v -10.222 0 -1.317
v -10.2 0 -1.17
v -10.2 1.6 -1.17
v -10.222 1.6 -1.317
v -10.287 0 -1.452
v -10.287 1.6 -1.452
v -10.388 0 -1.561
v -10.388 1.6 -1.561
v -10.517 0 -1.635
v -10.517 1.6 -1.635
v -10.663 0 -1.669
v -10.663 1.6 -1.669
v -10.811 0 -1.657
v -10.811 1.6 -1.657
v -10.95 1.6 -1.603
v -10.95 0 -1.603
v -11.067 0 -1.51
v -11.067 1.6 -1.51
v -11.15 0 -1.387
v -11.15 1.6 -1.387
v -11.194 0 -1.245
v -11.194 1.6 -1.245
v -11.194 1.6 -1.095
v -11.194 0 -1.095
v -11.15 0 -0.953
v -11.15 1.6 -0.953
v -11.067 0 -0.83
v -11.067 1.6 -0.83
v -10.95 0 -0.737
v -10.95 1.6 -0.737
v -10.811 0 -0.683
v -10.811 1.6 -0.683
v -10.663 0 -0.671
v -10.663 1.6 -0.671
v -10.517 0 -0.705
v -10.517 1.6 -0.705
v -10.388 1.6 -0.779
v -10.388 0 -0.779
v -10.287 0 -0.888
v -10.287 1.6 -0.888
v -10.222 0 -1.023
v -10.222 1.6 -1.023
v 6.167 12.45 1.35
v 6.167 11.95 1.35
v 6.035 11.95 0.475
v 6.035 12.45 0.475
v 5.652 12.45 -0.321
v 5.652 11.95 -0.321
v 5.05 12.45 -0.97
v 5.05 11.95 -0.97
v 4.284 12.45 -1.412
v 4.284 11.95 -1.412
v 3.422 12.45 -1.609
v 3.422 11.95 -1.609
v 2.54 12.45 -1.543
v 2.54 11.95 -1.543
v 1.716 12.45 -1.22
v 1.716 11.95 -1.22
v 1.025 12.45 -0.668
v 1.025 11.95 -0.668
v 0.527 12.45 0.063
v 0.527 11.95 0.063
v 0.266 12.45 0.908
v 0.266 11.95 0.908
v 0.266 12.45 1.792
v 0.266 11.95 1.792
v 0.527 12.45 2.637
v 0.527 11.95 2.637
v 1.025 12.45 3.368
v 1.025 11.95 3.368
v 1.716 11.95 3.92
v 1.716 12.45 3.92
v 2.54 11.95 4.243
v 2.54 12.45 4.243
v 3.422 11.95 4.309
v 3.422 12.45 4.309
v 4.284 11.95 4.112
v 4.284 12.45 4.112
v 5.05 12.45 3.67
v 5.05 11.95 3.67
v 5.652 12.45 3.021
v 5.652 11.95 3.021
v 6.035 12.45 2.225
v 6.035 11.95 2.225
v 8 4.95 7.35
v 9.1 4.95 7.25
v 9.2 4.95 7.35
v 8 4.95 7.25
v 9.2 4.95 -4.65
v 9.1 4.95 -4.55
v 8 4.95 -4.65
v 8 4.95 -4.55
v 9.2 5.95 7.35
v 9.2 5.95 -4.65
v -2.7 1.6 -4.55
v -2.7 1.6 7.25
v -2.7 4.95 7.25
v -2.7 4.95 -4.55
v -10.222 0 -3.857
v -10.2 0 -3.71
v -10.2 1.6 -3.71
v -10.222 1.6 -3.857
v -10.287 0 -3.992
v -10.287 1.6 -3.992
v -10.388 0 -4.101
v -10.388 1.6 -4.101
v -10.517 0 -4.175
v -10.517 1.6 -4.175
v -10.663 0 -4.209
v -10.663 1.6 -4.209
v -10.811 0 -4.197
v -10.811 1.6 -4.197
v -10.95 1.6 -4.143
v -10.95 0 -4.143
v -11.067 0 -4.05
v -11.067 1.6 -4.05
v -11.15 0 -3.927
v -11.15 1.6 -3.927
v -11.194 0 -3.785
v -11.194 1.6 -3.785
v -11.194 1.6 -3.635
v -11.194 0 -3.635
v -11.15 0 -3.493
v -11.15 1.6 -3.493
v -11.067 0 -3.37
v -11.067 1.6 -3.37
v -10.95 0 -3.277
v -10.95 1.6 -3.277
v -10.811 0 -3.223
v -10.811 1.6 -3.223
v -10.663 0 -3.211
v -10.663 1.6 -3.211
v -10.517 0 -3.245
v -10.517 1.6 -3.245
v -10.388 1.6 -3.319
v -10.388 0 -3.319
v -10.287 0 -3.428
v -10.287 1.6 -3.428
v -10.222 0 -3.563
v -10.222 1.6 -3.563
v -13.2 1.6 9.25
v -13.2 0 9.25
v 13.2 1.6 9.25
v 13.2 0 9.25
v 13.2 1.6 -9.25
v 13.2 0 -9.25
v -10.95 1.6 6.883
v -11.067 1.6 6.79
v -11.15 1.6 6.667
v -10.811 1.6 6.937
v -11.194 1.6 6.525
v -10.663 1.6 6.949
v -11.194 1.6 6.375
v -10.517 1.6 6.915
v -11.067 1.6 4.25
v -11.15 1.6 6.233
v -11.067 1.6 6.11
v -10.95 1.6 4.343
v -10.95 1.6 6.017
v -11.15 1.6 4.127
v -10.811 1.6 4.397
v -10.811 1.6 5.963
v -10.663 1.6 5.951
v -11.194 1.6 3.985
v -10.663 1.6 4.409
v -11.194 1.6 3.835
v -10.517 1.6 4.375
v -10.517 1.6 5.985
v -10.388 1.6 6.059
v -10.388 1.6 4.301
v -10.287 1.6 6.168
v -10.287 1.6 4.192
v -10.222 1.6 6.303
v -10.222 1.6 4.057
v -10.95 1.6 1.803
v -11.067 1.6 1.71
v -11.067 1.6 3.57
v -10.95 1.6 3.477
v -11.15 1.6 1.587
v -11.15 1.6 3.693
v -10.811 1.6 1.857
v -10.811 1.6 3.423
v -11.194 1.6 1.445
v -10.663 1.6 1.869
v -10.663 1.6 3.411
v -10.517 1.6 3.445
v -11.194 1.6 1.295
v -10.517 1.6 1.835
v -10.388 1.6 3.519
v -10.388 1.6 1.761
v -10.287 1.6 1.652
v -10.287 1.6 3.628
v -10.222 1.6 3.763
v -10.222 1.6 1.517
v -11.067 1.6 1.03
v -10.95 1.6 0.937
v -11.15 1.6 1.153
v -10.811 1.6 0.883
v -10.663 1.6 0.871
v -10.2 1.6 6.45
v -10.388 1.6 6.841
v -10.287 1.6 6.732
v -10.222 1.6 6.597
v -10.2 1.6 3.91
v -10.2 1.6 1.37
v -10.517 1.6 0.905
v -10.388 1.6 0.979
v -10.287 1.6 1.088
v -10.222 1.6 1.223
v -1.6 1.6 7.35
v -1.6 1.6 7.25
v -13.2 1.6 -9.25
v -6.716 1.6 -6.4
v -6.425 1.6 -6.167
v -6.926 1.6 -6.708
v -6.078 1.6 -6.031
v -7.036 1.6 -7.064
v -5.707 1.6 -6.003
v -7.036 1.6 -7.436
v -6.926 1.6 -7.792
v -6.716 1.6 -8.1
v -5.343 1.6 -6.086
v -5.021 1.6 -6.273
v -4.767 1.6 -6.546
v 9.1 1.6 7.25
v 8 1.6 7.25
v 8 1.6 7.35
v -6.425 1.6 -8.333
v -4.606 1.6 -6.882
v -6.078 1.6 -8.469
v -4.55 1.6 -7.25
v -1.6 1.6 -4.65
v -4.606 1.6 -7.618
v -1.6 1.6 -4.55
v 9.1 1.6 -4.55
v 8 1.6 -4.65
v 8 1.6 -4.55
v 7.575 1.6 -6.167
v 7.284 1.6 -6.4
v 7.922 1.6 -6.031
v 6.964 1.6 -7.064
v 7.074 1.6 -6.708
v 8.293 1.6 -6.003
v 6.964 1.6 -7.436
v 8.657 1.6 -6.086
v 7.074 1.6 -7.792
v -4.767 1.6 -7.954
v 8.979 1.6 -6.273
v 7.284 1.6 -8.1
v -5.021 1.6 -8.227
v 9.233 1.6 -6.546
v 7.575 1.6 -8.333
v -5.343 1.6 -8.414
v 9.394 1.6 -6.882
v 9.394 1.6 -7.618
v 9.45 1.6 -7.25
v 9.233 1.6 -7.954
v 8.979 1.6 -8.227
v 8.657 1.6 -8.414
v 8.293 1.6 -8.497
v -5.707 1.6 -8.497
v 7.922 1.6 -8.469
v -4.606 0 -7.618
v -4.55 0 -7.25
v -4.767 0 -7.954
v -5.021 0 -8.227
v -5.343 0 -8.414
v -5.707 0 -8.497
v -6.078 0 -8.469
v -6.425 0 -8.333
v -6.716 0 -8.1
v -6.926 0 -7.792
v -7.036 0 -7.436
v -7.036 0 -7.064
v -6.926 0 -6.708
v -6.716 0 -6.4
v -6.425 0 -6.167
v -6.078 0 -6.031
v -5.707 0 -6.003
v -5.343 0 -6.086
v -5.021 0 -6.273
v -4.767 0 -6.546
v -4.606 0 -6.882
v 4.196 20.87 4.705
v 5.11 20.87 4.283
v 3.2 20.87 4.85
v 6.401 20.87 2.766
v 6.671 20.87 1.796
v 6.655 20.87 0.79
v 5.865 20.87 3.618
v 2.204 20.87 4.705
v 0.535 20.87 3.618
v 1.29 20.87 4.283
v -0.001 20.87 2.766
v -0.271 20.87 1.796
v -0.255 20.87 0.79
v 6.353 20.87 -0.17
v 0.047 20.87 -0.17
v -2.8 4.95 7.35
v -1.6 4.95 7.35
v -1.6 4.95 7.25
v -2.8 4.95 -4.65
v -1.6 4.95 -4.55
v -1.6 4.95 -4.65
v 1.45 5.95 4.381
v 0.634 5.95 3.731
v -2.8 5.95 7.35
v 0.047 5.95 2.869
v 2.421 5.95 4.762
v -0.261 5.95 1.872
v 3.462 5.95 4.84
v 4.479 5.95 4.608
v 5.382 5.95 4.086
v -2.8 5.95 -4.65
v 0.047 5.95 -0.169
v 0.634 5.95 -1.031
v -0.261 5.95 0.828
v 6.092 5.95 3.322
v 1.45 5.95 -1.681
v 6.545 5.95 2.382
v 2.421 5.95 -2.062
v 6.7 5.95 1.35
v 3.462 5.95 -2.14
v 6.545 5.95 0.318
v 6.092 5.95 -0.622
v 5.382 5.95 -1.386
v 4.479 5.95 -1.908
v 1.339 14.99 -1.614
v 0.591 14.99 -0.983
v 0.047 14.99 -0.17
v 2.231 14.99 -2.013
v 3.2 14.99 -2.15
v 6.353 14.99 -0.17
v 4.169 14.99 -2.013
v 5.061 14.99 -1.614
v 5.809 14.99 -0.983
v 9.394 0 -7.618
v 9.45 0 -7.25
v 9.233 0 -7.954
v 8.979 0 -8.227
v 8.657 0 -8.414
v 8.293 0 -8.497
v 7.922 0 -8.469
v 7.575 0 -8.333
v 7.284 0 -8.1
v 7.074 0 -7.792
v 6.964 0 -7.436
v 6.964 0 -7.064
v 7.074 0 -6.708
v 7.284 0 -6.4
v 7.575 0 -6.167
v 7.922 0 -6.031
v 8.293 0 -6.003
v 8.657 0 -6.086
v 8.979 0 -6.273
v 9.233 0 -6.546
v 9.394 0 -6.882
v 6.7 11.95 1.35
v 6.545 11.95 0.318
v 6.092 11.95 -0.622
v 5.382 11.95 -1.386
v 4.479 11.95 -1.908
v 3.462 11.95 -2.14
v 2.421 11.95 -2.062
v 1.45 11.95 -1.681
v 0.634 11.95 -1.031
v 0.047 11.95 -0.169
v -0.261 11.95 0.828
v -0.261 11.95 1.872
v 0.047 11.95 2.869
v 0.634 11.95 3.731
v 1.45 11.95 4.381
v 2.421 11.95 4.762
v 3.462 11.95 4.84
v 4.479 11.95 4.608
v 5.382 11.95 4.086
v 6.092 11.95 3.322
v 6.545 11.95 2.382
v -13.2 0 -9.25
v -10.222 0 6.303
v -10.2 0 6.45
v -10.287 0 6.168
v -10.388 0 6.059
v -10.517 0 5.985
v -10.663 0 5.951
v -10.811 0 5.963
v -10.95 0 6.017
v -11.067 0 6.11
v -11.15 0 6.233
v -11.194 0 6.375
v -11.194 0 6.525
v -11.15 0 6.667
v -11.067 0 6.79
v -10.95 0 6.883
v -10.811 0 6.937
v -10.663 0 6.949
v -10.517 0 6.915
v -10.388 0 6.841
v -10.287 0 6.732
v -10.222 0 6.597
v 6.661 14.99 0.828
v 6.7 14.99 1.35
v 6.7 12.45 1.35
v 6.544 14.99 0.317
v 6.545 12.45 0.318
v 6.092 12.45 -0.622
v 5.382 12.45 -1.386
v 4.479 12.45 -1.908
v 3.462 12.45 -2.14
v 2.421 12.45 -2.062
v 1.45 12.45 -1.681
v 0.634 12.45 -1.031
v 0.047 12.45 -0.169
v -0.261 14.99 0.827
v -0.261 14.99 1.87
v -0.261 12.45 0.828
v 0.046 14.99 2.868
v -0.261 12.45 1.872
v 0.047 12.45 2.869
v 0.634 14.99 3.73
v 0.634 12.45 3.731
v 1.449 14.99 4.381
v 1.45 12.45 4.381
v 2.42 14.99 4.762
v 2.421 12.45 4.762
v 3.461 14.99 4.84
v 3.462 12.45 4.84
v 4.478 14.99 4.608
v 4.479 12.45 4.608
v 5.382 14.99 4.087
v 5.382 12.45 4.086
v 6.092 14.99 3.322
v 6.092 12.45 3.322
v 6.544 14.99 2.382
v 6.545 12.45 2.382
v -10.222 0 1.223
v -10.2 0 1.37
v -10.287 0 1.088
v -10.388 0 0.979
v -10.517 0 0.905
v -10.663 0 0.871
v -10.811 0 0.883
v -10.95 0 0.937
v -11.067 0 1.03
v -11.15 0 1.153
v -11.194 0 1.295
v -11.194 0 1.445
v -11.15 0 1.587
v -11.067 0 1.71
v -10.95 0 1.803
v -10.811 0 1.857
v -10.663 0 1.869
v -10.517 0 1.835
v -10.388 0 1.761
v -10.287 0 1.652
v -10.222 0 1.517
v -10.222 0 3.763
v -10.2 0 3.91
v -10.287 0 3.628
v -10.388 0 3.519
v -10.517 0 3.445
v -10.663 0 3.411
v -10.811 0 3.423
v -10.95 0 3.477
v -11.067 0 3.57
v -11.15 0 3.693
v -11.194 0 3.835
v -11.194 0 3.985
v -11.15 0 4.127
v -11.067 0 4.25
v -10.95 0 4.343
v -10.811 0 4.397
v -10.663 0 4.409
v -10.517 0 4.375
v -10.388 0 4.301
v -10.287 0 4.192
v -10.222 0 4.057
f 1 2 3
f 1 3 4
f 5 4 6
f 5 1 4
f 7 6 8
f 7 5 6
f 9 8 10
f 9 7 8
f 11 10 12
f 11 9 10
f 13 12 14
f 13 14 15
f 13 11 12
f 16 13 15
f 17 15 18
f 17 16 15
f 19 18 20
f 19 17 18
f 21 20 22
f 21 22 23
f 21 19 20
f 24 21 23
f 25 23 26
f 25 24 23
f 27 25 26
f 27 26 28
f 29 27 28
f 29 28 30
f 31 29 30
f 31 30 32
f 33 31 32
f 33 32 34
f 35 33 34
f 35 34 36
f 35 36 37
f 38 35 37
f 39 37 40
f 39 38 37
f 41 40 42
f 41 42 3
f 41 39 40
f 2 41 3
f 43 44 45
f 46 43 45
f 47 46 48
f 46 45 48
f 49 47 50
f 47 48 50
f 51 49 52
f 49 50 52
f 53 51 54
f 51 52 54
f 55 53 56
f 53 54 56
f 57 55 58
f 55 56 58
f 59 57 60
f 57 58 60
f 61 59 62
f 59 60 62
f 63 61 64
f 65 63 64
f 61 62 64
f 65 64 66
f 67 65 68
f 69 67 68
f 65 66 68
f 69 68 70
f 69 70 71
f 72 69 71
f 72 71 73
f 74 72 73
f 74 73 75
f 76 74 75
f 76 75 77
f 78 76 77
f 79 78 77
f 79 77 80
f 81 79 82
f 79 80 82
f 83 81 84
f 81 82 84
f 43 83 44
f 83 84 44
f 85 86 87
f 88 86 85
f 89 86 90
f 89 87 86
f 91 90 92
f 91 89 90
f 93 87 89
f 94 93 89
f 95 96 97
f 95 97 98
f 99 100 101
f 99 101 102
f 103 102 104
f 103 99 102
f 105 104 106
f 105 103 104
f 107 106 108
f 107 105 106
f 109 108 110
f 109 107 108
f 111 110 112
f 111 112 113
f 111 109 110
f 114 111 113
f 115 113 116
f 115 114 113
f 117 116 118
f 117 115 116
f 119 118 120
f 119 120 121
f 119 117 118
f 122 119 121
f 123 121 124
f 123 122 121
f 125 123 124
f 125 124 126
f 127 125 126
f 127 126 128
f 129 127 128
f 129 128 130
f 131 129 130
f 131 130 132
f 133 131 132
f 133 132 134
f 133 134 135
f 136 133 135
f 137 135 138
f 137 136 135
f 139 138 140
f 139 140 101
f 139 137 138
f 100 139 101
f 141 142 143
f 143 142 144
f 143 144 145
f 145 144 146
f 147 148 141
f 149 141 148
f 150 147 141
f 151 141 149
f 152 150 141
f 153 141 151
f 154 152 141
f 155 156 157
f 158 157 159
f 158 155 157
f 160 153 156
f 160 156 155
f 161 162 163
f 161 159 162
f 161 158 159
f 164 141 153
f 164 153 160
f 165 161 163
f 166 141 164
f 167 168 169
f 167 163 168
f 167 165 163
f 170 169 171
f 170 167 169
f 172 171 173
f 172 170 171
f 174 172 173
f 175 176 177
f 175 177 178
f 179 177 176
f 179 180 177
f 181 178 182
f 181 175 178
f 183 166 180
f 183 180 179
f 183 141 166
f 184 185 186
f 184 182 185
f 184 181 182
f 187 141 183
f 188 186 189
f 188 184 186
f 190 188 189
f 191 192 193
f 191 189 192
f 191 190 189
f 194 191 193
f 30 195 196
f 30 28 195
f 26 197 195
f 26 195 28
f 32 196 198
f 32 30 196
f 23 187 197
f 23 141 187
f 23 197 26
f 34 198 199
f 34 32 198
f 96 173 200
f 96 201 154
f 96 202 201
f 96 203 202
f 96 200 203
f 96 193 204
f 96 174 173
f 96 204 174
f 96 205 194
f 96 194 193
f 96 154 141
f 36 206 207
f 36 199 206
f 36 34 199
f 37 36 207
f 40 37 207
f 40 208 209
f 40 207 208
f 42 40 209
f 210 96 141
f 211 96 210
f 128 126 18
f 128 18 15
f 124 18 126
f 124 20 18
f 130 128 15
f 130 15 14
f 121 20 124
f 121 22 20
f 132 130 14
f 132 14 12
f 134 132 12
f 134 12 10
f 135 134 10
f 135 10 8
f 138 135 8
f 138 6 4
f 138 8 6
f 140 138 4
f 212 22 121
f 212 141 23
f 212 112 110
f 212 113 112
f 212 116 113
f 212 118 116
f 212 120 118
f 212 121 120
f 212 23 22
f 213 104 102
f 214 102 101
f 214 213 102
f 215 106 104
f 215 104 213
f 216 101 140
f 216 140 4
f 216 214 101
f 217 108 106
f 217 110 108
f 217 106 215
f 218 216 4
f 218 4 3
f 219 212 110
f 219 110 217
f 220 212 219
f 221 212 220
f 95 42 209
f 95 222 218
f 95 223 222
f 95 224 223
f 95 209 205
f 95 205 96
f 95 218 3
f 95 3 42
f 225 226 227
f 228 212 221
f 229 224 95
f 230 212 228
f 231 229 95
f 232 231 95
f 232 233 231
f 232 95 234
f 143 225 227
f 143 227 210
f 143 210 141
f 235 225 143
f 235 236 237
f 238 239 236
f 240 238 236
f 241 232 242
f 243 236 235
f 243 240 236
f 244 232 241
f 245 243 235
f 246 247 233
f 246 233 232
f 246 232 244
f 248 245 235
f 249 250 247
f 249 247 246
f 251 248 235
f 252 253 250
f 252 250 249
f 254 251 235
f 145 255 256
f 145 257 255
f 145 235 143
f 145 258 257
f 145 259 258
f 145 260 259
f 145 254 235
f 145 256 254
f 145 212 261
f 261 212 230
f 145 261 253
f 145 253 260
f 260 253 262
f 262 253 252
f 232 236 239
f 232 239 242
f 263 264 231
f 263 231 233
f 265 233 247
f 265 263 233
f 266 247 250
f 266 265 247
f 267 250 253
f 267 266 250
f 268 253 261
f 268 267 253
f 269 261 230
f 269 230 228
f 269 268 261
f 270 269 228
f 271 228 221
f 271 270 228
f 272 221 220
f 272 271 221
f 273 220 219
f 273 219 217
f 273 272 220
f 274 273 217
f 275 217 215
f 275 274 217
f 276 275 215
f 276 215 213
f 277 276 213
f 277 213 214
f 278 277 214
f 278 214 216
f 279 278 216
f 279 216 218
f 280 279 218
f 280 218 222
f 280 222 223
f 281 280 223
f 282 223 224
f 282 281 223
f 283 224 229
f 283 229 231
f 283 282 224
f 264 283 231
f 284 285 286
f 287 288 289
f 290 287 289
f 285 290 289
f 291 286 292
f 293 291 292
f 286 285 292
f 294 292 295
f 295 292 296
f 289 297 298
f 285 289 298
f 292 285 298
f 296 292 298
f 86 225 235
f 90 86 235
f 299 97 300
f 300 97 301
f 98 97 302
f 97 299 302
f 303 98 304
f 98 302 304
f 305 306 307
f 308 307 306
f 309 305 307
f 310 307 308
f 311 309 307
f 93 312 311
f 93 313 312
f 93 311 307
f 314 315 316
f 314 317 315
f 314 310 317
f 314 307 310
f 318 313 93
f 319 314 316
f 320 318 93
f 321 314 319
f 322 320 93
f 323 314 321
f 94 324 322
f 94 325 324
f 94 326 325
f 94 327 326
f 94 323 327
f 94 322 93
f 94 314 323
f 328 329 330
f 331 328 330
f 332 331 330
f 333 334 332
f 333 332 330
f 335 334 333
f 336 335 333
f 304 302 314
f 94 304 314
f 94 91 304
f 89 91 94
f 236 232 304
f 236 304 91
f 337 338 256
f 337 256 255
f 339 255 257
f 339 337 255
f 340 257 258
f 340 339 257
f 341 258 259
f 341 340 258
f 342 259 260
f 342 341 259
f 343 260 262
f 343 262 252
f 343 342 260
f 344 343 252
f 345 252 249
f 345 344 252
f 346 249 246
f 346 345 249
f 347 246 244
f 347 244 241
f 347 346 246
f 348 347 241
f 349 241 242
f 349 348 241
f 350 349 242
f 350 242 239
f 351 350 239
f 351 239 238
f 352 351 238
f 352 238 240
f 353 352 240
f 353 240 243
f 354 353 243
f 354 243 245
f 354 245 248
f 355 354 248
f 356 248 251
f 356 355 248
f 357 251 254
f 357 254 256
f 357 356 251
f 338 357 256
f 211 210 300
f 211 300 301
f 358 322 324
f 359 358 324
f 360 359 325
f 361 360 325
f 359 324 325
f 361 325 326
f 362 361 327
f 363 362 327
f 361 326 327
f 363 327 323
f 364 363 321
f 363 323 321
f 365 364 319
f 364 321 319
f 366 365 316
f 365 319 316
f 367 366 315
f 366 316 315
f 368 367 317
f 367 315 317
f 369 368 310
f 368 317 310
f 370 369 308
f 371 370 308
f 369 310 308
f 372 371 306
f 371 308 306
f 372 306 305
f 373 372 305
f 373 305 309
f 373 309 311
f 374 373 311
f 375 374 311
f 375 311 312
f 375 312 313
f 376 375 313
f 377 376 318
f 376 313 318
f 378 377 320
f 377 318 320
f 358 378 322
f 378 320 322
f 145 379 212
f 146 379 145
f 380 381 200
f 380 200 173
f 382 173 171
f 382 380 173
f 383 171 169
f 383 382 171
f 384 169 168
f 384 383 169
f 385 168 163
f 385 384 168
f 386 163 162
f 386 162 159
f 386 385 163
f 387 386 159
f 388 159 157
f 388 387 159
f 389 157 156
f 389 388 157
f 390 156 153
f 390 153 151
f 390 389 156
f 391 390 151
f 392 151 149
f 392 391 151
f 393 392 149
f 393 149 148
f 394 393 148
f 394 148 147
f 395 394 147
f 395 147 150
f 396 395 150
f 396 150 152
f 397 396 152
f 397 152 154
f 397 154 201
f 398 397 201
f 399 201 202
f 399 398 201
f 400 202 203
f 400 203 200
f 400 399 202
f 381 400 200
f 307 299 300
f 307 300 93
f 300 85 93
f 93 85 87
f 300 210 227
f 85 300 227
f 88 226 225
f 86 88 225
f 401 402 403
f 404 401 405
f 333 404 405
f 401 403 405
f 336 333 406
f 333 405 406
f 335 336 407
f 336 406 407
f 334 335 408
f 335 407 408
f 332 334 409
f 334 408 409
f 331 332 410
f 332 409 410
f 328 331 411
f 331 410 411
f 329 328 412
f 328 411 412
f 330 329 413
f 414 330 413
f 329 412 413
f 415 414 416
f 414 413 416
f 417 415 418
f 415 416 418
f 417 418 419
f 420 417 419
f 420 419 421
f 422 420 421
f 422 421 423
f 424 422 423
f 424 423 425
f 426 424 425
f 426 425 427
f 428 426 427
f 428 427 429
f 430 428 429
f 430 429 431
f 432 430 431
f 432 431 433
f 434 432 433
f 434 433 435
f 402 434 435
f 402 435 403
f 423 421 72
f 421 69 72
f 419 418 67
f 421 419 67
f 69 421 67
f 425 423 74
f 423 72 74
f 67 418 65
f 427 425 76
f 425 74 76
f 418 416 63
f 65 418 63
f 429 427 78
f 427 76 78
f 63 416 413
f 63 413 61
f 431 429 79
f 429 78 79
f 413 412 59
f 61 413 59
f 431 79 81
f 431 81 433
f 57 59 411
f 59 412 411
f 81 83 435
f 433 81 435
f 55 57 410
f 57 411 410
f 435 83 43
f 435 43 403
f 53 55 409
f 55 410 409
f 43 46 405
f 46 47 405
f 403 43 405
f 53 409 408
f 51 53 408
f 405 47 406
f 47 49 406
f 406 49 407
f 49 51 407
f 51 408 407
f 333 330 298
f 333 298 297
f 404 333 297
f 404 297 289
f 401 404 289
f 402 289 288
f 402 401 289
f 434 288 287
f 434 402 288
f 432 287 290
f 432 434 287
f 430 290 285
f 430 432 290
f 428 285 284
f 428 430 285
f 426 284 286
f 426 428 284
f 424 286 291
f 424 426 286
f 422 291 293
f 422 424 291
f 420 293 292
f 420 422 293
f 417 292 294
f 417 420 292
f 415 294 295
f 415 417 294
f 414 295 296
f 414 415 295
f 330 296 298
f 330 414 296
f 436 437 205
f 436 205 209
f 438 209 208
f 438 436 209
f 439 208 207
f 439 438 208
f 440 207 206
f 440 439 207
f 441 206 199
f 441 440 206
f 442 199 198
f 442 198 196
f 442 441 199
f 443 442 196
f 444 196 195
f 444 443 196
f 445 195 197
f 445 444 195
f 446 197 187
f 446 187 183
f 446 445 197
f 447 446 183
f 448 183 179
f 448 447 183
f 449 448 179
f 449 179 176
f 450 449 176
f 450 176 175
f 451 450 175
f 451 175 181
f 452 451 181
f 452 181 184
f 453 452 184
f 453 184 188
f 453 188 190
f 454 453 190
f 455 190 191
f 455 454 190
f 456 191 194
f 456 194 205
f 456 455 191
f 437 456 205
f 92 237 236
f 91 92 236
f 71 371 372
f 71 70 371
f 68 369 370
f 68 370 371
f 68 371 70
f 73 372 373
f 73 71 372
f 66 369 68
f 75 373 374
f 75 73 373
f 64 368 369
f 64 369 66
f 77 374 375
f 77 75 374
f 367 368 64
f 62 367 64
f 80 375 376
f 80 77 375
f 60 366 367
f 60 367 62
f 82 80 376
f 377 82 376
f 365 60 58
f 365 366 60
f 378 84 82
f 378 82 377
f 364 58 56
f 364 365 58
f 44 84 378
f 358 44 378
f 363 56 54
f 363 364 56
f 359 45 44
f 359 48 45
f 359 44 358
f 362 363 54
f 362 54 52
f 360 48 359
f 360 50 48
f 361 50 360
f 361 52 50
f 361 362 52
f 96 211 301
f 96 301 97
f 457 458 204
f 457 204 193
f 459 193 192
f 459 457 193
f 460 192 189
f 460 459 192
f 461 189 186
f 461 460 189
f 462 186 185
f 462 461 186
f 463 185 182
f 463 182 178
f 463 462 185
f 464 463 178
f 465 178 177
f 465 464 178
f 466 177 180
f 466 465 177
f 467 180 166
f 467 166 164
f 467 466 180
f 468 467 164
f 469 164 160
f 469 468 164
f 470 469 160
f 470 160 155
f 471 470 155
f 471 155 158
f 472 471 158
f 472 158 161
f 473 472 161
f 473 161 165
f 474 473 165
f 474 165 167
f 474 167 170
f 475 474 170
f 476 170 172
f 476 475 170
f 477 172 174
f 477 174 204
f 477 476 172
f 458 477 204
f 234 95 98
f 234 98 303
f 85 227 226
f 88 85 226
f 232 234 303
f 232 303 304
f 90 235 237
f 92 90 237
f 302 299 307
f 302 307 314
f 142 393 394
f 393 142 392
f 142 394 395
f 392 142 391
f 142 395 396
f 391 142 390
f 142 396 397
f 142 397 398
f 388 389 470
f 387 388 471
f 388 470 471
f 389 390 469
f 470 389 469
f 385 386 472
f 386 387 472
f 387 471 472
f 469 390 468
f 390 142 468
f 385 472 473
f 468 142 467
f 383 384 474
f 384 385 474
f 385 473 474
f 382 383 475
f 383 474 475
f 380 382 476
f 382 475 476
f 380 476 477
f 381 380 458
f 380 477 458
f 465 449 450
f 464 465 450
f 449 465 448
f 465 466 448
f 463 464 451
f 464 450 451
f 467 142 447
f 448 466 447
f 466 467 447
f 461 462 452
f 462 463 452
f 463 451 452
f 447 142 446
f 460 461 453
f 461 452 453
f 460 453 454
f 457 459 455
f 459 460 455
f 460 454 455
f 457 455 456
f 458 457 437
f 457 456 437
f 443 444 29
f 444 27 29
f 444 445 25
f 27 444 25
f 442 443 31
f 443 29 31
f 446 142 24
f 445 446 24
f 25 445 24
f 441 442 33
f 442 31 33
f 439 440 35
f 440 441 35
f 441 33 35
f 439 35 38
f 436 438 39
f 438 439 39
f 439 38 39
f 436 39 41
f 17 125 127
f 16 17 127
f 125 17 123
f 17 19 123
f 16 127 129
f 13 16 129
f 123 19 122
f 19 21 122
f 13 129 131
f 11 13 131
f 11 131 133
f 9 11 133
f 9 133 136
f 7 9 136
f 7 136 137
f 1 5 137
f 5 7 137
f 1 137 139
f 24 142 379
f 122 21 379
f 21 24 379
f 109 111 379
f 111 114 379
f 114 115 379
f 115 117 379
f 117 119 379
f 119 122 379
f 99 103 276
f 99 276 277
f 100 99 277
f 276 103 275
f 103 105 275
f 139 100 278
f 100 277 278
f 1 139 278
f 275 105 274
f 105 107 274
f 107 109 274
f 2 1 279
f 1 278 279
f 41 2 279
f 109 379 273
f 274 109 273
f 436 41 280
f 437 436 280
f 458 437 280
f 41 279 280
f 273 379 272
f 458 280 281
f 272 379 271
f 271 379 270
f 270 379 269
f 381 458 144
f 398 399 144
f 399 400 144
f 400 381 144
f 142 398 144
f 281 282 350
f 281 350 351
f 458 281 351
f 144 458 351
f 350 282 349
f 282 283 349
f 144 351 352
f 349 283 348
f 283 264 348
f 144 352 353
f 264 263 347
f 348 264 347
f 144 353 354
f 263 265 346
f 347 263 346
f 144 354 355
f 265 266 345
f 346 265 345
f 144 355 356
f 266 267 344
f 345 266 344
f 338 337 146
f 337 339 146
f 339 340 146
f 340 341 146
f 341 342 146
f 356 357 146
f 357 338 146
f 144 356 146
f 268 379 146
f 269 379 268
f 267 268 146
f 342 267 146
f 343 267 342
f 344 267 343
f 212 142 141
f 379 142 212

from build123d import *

# Parameters (mm, degrees)
SKETCH1_W           = 26.4
SKETCH1_H           = 18.5
SKETCH1_R           = 1.25
SKETCH1_R_2         = 0.5
BOSS_EXTRUDE1_DEPTH = 1.6
SKETCH2_W           = 12
SKETCH2_H           = 12
BOSS_EXTRUDE2_DEPTH = 4.35
CUT_EXTRUDE1_DEPTH  = 3.35
SKETCH4_R           = 3.5
BOSS_EXTRUDE3_DEPTH = 6
SKETCH5_R           = 2.967094381
BOSS_EXTRUDE4_DEPTH = 0.5
SKETCH6_R           = 3.5
BOSS_EXTRUDE5_DEPTH = 2.54
BOSS_EXTRUDE6_DEPTH = 5.88


with BuildPart() as part:
    # Sketch1 → Boss-Extrude1 (new body)
    with BuildSketch(Plane(origin=(0, 0, 0), x_dir=(1, 0, 0), z_dir=(0, 1, 0))):
        Rectangle(SKETCH1_W, SKETCH1_H)
        with Locations((-5.8, 7.25)):
            Circle(SKETCH1_R, mode=Mode.SUBTRACT)
        with Locations((8.2, 7.25)):
            Circle(SKETCH1_R, mode=Mode.SUBTRACT)
        with Locations((-10.7, -6.45)):
            Circle(SKETCH1_R_2, mode=Mode.SUBTRACT)
        with Locations((-10.7, -3.91)):
            Circle(SKETCH1_R_2, mode=Mode.SUBTRACT)
        with Locations((-10.7, -1.37)):
            Circle(SKETCH1_R_2, mode=Mode.SUBTRACT)
        with Locations((-10.7, 1.17)):
            Circle(SKETCH1_R_2, mode=Mode.SUBTRACT)
        with Locations((-10.7, 3.71)):
            Circle(SKETCH1_R_2, mode=Mode.SUBTRACT)
    extrude(amount=BOSS_EXTRUDE1_DEPTH)

    # Sketch2 → Boss-Extrude2 (add)
    with BuildSketch(Plane(origin=(0, 1.6, 0), x_dir=(1, 0, 0), z_dir=(0, 1, 0))):
        with Locations((3.2, -1.35)):
            Rectangle(SKETCH2_W, SKETCH2_H)
    extrude(amount=BOSS_EXTRUDE2_DEPTH)

    # Sketch3 → Cut-Extrude1 (cut)
    with BuildSketch(Plane(origin=(0, 1.6, 0), x_dir=(1, 0, 0), z_dir=(0, 1, 0))):
        Polygon((-1.6, 4.65), (-2.8, 4.65), (-2.8, -7.35), (-1.6, -7.35), (-1.6, -7.25), (-2.7, -7.25), (-2.7, 4.55), (-1.6, 4.55), align=None)
        Polygon((8, -7.35), (8, -7.25), (9.1, -7.25), (9.1, 4.55), (8, 4.55), (8, 4.65), (9.2, 4.65), (9.2, -7.35), align=None)
    extrude(amount=CUT_EXTRUDE1_DEPTH, mode=Mode.SUBTRACT)

    # Sketch4 → Boss-Extrude3 (add)
    with BuildSketch(Plane(origin=(0, 5.95, 0), x_dir=(1, 0, 0), z_dir=(0, 1, 0))):
        with Locations((3.2, -1.35)):
            Circle(SKETCH4_R)
    extrude(amount=BOSS_EXTRUDE3_DEPTH)

    # Sketch5 → Boss-Extrude4 (add)
    with BuildSketch(Plane(origin=(0, 11.95, 0), x_dir=(1, 0, 0), z_dir=(0, 1, 0))):
        with Locations((3.2, -1.35)):
            Circle(SKETCH5_R)
    extrude(amount=BOSS_EXTRUDE4_DEPTH)

    # Sketch6 → Boss-Extrude5 (add)
    with BuildSketch(Plane(origin=(0, 12.45, 0), x_dir=(1, 0, 0), z_dir=(0, 1, 0))):
        with Locations((3.2, -1.35)):
            Circle(SKETCH6_R)
    extrude(amount=BOSS_EXTRUDE5_DEPTH)

    # Sketch7 → Boss-Extrude6 (add)
    with BuildSketch(Plane(origin=(0, 14.99, 0), x_dir=(1, 0, 0), z_dir=(0, 1, 0))):
        with BuildLine():
            Line((0.047286883, 0.17), (6.352713117, 0.17))
            ThreePointArc((6.352713117, 0.17), (3.2, -4.85), (0.047286883, 0.17))
        make_face()
    extrude(amount=BOSS_EXTRUDE6_DEPTH)


solid = part.part
